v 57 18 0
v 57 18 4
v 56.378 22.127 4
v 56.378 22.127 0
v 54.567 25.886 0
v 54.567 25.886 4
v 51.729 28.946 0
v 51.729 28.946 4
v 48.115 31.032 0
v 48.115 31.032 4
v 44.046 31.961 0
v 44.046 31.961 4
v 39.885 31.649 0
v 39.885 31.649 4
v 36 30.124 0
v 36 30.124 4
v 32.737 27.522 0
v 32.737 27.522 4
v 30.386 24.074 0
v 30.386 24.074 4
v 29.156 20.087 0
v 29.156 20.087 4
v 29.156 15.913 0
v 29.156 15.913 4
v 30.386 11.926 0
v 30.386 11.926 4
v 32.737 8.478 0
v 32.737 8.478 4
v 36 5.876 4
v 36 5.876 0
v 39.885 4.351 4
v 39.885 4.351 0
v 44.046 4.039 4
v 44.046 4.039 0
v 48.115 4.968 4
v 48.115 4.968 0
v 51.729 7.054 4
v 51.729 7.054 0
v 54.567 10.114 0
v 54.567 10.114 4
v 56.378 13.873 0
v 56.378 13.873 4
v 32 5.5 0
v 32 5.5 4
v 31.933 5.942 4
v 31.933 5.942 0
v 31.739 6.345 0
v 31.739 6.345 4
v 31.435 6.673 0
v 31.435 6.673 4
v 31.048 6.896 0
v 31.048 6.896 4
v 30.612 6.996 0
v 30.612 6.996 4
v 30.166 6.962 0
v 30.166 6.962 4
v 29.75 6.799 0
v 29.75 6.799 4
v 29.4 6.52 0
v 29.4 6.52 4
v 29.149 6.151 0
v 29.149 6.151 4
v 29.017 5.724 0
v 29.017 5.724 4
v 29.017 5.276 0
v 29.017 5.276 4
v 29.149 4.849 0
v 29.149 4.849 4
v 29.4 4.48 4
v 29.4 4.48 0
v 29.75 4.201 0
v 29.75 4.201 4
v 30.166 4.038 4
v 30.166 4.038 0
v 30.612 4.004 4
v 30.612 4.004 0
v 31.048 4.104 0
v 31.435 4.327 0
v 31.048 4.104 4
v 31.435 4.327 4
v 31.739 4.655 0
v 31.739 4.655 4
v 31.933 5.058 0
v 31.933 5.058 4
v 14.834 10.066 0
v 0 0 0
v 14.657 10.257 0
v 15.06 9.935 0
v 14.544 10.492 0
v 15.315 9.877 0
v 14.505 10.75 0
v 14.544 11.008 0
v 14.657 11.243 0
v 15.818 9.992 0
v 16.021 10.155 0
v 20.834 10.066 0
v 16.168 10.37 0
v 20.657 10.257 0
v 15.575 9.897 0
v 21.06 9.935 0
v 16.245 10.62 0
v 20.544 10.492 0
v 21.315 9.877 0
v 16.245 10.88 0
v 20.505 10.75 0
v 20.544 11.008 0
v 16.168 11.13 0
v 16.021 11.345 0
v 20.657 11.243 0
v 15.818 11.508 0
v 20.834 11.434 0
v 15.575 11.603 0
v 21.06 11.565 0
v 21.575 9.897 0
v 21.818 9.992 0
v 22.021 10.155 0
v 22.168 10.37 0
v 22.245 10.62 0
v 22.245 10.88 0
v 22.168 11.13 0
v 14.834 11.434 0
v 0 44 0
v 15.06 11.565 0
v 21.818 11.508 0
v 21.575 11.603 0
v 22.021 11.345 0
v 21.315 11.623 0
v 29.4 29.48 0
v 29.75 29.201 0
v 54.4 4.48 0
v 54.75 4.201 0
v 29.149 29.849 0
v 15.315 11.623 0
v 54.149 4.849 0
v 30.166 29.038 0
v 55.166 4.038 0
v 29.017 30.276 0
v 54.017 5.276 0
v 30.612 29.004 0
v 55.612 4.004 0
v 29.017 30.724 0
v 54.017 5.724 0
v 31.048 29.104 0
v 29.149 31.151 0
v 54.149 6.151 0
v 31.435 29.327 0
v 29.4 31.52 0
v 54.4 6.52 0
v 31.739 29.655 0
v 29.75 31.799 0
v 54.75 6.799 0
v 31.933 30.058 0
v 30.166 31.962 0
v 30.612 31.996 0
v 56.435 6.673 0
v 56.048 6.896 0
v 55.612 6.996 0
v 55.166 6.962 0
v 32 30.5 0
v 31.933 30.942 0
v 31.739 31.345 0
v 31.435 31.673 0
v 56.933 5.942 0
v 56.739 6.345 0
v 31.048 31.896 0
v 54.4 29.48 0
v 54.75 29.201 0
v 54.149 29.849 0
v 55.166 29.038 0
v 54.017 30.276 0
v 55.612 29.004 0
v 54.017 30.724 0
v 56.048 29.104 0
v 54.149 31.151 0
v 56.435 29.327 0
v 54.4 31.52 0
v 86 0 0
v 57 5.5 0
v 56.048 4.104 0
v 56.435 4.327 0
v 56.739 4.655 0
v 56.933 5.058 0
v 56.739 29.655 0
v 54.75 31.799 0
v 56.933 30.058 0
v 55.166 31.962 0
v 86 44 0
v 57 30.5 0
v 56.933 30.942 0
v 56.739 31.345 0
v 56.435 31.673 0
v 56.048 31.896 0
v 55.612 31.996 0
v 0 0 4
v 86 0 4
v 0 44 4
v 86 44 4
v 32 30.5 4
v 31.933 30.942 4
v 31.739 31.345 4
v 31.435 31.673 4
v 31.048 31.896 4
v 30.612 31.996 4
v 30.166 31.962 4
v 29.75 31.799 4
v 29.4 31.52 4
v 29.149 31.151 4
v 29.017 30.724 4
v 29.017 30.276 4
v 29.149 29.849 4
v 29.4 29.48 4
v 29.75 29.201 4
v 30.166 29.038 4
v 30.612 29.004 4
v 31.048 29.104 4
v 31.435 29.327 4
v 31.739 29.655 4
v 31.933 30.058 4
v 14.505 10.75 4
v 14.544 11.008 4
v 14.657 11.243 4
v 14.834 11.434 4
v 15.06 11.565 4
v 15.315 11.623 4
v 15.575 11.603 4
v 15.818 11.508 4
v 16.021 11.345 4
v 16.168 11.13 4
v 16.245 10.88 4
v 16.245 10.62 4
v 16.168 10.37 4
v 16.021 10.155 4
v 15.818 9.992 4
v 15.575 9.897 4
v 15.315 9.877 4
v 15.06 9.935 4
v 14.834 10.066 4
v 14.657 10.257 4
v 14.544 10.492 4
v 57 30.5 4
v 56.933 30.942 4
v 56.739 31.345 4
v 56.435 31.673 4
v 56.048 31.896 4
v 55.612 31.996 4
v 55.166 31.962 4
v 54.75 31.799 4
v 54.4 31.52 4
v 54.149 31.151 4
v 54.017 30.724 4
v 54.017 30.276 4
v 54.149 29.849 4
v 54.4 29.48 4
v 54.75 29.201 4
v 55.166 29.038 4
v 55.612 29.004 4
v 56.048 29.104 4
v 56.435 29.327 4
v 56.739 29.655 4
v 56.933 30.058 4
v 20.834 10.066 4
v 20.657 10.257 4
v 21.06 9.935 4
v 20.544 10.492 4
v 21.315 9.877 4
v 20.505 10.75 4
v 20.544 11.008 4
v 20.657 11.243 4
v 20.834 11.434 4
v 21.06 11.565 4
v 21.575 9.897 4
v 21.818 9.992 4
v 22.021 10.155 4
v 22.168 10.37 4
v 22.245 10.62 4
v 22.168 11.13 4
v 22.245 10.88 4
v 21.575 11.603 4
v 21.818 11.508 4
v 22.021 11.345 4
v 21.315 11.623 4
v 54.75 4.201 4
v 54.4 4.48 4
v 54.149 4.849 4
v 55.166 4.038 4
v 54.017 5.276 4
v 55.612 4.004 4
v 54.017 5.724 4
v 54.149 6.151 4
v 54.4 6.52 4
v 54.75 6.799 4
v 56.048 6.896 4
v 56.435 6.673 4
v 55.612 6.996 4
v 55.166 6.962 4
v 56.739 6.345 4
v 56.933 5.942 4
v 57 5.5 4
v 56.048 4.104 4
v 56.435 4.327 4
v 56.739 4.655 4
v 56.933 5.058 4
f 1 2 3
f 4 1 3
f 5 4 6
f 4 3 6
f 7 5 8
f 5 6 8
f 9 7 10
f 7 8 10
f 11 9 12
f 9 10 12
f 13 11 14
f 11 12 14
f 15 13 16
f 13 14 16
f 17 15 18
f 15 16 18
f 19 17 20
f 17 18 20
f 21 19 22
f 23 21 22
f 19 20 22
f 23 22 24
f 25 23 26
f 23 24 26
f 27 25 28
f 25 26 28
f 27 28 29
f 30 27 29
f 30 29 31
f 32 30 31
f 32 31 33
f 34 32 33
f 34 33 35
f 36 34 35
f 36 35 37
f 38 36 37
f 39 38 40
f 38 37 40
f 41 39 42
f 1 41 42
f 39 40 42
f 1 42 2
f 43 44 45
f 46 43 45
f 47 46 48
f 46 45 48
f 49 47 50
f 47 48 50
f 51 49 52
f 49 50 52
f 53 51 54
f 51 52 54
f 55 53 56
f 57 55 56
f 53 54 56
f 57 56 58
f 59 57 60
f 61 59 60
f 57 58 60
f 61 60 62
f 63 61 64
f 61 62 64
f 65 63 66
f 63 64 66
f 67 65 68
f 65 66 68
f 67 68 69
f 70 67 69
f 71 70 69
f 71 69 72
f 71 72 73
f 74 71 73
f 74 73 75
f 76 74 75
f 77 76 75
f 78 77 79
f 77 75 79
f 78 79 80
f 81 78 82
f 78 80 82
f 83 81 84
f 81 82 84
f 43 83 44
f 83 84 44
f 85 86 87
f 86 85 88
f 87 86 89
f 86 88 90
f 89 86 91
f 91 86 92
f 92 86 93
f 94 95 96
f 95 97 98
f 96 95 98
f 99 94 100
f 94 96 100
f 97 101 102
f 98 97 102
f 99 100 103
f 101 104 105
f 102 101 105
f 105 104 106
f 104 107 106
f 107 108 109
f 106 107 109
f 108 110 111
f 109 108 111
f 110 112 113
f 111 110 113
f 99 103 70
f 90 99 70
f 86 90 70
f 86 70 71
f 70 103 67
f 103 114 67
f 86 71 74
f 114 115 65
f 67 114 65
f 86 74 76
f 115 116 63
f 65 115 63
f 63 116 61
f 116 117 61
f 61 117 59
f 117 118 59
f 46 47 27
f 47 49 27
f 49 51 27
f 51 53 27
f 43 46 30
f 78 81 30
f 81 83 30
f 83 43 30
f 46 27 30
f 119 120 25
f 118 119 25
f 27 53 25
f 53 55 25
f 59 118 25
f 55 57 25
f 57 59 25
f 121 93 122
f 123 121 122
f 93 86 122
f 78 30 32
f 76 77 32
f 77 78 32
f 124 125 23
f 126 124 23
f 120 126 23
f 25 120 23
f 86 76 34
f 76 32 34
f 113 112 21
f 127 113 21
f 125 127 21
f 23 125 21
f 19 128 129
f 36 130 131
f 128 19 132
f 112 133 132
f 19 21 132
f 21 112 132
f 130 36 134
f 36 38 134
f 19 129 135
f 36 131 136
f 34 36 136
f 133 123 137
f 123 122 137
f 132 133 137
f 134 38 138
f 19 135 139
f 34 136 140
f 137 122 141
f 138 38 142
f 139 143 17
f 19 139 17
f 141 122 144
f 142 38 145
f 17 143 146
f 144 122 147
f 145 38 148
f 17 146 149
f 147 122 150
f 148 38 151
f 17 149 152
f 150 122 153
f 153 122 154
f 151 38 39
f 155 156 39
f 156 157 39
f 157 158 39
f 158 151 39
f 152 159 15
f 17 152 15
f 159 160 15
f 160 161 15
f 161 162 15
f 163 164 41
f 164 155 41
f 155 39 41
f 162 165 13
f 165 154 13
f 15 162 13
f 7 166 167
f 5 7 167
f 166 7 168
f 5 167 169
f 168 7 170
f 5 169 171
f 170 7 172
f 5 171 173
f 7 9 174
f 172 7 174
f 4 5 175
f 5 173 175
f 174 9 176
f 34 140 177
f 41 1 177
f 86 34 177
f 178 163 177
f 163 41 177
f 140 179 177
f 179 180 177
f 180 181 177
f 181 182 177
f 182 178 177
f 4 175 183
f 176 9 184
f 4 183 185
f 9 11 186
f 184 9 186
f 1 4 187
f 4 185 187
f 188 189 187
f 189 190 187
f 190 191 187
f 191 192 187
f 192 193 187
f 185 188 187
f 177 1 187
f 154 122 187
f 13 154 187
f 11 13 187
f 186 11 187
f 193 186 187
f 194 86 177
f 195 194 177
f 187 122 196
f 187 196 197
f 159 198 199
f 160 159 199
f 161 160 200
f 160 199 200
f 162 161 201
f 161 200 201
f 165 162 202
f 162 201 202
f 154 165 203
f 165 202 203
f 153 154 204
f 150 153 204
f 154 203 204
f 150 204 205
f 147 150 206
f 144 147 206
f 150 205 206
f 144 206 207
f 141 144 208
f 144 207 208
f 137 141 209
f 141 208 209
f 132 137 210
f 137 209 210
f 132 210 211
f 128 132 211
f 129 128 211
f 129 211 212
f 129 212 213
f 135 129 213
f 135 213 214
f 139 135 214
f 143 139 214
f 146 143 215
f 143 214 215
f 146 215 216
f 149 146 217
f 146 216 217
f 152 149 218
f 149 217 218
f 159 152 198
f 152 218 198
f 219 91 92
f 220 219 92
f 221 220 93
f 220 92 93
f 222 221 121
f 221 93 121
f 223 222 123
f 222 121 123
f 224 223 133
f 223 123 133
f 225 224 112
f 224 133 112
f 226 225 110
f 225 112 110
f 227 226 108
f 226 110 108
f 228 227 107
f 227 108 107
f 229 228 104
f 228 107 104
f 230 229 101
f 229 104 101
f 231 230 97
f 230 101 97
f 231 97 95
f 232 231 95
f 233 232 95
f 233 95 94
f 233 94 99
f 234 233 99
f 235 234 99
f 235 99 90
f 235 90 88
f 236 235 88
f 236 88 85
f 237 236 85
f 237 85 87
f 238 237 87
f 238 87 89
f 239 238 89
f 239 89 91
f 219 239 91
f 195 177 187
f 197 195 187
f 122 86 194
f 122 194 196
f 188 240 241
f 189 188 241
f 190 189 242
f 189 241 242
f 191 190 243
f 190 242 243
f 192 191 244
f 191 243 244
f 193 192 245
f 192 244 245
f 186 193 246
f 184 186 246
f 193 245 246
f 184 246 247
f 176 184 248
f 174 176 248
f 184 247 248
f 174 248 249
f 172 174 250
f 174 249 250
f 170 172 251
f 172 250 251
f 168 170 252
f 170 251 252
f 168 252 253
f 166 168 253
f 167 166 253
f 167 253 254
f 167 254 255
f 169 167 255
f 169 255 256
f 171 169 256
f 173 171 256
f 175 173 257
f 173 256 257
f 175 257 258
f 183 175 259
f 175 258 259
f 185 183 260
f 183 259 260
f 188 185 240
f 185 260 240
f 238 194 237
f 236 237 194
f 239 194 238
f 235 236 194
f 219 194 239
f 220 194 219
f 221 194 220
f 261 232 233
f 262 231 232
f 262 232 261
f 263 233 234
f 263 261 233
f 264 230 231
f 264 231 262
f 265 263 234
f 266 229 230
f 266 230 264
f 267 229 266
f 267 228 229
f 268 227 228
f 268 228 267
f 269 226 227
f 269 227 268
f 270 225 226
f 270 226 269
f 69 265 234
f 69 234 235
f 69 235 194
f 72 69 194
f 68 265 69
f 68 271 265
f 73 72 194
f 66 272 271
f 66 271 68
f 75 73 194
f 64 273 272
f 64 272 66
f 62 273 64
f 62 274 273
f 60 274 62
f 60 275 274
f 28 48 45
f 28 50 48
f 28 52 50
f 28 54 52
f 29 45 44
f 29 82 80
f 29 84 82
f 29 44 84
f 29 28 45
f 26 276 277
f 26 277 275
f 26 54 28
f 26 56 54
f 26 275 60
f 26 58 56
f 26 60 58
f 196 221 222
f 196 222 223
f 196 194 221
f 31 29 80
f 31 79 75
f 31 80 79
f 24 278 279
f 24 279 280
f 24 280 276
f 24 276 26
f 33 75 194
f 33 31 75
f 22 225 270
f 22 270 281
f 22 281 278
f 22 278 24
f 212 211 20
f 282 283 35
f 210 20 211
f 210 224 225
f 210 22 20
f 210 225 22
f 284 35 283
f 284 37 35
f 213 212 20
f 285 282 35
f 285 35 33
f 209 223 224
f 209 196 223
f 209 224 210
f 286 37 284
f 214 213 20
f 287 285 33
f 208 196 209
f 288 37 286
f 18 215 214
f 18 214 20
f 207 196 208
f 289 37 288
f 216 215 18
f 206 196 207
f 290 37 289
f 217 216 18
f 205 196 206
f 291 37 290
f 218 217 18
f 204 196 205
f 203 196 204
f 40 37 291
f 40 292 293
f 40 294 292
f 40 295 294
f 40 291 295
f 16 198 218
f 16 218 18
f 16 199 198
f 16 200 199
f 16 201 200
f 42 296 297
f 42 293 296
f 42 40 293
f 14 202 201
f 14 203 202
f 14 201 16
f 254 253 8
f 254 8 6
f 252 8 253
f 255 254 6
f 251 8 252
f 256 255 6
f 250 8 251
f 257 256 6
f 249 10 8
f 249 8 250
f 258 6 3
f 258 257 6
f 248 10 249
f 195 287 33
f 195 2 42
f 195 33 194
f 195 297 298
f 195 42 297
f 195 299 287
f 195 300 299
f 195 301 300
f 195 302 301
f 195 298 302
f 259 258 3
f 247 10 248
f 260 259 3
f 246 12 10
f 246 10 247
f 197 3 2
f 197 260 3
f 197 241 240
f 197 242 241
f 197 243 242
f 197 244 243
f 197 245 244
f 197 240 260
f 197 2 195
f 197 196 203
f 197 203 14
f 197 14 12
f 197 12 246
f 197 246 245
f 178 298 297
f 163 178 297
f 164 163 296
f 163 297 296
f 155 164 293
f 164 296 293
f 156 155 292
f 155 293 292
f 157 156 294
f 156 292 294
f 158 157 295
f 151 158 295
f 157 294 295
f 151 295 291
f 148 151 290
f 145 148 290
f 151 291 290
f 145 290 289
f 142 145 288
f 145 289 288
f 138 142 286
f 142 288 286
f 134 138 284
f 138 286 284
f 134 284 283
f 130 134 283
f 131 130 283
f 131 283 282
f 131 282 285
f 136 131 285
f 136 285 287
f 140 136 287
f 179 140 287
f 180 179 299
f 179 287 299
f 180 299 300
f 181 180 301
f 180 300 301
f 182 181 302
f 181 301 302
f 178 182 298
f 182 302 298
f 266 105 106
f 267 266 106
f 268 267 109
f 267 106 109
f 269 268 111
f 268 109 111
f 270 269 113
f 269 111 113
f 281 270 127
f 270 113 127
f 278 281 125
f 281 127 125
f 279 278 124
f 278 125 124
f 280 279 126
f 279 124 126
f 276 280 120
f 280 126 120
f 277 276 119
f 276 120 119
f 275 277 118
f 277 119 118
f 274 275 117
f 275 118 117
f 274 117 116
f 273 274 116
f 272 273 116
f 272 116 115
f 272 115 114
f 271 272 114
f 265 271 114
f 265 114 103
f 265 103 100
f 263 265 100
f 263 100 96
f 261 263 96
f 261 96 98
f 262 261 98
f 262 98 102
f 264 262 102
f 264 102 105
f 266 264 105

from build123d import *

# Parameters (mm, degrees)
SKETCH1_W             = 86
SKETCH1_H             = 44
BOSS_EXTRUDE1_DEPTH   = 4
SKETCH2_R             = 14
CUT_EXTRUDE1_DEPTH    = 4
SKETCH3_R             = 1.5
CUT_EXTRUDE3_DEPTH    = 4
F_1_0MM_DOWEL_HOLE1_D = 1.75


with BuildPart() as part:
    # Sketch1 → Boss-Extrude1 (new body)
    with BuildSketch(Plane.XY):
        with Locations((43, 22)):
            Rectangle(SKETCH1_W, SKETCH1_H)
    extrude(amount=BOSS_EXTRUDE1_DEPTH)

    # Sketch2 → Cut-Extrude1 (cut)
    with BuildSketch(Plane.XY.offset(4)):
        with Locations((43, 18)):
            Circle(SKETCH2_R)
    extrude(amount=-CUT_EXTRUDE1_DEPTH, mode=Mode.SUBTRACT)

    # Sketch3 → Cut-Extrude3 (cut)
    with BuildSketch(Plane.XY.offset(4)):
        with Locations((30.5, 30.5)):
            Circle(SKETCH3_R)
        with Locations((55.5, 30.5)):
            Circle(SKETCH3_R)
        with Locations((55.5, 5.5)):
            Circle(SKETCH3_R)
        with Locations((30.5, 5.5)):
            Circle(SKETCH3_R)
    extrude(amount=-CUT_EXTRUDE3_DEPTH, mode=Mode.SUBTRACT)

    # Ø1.0mm Dowel Hole1 (through all)
    with Locations(Plane.XY.offset(4)):
        with Locations((15.38, 10.75), (21.38, 10.75)):
            Hole(F_1_0MM_DOWEL_HOLE1_D / 2)


solid = part.part
